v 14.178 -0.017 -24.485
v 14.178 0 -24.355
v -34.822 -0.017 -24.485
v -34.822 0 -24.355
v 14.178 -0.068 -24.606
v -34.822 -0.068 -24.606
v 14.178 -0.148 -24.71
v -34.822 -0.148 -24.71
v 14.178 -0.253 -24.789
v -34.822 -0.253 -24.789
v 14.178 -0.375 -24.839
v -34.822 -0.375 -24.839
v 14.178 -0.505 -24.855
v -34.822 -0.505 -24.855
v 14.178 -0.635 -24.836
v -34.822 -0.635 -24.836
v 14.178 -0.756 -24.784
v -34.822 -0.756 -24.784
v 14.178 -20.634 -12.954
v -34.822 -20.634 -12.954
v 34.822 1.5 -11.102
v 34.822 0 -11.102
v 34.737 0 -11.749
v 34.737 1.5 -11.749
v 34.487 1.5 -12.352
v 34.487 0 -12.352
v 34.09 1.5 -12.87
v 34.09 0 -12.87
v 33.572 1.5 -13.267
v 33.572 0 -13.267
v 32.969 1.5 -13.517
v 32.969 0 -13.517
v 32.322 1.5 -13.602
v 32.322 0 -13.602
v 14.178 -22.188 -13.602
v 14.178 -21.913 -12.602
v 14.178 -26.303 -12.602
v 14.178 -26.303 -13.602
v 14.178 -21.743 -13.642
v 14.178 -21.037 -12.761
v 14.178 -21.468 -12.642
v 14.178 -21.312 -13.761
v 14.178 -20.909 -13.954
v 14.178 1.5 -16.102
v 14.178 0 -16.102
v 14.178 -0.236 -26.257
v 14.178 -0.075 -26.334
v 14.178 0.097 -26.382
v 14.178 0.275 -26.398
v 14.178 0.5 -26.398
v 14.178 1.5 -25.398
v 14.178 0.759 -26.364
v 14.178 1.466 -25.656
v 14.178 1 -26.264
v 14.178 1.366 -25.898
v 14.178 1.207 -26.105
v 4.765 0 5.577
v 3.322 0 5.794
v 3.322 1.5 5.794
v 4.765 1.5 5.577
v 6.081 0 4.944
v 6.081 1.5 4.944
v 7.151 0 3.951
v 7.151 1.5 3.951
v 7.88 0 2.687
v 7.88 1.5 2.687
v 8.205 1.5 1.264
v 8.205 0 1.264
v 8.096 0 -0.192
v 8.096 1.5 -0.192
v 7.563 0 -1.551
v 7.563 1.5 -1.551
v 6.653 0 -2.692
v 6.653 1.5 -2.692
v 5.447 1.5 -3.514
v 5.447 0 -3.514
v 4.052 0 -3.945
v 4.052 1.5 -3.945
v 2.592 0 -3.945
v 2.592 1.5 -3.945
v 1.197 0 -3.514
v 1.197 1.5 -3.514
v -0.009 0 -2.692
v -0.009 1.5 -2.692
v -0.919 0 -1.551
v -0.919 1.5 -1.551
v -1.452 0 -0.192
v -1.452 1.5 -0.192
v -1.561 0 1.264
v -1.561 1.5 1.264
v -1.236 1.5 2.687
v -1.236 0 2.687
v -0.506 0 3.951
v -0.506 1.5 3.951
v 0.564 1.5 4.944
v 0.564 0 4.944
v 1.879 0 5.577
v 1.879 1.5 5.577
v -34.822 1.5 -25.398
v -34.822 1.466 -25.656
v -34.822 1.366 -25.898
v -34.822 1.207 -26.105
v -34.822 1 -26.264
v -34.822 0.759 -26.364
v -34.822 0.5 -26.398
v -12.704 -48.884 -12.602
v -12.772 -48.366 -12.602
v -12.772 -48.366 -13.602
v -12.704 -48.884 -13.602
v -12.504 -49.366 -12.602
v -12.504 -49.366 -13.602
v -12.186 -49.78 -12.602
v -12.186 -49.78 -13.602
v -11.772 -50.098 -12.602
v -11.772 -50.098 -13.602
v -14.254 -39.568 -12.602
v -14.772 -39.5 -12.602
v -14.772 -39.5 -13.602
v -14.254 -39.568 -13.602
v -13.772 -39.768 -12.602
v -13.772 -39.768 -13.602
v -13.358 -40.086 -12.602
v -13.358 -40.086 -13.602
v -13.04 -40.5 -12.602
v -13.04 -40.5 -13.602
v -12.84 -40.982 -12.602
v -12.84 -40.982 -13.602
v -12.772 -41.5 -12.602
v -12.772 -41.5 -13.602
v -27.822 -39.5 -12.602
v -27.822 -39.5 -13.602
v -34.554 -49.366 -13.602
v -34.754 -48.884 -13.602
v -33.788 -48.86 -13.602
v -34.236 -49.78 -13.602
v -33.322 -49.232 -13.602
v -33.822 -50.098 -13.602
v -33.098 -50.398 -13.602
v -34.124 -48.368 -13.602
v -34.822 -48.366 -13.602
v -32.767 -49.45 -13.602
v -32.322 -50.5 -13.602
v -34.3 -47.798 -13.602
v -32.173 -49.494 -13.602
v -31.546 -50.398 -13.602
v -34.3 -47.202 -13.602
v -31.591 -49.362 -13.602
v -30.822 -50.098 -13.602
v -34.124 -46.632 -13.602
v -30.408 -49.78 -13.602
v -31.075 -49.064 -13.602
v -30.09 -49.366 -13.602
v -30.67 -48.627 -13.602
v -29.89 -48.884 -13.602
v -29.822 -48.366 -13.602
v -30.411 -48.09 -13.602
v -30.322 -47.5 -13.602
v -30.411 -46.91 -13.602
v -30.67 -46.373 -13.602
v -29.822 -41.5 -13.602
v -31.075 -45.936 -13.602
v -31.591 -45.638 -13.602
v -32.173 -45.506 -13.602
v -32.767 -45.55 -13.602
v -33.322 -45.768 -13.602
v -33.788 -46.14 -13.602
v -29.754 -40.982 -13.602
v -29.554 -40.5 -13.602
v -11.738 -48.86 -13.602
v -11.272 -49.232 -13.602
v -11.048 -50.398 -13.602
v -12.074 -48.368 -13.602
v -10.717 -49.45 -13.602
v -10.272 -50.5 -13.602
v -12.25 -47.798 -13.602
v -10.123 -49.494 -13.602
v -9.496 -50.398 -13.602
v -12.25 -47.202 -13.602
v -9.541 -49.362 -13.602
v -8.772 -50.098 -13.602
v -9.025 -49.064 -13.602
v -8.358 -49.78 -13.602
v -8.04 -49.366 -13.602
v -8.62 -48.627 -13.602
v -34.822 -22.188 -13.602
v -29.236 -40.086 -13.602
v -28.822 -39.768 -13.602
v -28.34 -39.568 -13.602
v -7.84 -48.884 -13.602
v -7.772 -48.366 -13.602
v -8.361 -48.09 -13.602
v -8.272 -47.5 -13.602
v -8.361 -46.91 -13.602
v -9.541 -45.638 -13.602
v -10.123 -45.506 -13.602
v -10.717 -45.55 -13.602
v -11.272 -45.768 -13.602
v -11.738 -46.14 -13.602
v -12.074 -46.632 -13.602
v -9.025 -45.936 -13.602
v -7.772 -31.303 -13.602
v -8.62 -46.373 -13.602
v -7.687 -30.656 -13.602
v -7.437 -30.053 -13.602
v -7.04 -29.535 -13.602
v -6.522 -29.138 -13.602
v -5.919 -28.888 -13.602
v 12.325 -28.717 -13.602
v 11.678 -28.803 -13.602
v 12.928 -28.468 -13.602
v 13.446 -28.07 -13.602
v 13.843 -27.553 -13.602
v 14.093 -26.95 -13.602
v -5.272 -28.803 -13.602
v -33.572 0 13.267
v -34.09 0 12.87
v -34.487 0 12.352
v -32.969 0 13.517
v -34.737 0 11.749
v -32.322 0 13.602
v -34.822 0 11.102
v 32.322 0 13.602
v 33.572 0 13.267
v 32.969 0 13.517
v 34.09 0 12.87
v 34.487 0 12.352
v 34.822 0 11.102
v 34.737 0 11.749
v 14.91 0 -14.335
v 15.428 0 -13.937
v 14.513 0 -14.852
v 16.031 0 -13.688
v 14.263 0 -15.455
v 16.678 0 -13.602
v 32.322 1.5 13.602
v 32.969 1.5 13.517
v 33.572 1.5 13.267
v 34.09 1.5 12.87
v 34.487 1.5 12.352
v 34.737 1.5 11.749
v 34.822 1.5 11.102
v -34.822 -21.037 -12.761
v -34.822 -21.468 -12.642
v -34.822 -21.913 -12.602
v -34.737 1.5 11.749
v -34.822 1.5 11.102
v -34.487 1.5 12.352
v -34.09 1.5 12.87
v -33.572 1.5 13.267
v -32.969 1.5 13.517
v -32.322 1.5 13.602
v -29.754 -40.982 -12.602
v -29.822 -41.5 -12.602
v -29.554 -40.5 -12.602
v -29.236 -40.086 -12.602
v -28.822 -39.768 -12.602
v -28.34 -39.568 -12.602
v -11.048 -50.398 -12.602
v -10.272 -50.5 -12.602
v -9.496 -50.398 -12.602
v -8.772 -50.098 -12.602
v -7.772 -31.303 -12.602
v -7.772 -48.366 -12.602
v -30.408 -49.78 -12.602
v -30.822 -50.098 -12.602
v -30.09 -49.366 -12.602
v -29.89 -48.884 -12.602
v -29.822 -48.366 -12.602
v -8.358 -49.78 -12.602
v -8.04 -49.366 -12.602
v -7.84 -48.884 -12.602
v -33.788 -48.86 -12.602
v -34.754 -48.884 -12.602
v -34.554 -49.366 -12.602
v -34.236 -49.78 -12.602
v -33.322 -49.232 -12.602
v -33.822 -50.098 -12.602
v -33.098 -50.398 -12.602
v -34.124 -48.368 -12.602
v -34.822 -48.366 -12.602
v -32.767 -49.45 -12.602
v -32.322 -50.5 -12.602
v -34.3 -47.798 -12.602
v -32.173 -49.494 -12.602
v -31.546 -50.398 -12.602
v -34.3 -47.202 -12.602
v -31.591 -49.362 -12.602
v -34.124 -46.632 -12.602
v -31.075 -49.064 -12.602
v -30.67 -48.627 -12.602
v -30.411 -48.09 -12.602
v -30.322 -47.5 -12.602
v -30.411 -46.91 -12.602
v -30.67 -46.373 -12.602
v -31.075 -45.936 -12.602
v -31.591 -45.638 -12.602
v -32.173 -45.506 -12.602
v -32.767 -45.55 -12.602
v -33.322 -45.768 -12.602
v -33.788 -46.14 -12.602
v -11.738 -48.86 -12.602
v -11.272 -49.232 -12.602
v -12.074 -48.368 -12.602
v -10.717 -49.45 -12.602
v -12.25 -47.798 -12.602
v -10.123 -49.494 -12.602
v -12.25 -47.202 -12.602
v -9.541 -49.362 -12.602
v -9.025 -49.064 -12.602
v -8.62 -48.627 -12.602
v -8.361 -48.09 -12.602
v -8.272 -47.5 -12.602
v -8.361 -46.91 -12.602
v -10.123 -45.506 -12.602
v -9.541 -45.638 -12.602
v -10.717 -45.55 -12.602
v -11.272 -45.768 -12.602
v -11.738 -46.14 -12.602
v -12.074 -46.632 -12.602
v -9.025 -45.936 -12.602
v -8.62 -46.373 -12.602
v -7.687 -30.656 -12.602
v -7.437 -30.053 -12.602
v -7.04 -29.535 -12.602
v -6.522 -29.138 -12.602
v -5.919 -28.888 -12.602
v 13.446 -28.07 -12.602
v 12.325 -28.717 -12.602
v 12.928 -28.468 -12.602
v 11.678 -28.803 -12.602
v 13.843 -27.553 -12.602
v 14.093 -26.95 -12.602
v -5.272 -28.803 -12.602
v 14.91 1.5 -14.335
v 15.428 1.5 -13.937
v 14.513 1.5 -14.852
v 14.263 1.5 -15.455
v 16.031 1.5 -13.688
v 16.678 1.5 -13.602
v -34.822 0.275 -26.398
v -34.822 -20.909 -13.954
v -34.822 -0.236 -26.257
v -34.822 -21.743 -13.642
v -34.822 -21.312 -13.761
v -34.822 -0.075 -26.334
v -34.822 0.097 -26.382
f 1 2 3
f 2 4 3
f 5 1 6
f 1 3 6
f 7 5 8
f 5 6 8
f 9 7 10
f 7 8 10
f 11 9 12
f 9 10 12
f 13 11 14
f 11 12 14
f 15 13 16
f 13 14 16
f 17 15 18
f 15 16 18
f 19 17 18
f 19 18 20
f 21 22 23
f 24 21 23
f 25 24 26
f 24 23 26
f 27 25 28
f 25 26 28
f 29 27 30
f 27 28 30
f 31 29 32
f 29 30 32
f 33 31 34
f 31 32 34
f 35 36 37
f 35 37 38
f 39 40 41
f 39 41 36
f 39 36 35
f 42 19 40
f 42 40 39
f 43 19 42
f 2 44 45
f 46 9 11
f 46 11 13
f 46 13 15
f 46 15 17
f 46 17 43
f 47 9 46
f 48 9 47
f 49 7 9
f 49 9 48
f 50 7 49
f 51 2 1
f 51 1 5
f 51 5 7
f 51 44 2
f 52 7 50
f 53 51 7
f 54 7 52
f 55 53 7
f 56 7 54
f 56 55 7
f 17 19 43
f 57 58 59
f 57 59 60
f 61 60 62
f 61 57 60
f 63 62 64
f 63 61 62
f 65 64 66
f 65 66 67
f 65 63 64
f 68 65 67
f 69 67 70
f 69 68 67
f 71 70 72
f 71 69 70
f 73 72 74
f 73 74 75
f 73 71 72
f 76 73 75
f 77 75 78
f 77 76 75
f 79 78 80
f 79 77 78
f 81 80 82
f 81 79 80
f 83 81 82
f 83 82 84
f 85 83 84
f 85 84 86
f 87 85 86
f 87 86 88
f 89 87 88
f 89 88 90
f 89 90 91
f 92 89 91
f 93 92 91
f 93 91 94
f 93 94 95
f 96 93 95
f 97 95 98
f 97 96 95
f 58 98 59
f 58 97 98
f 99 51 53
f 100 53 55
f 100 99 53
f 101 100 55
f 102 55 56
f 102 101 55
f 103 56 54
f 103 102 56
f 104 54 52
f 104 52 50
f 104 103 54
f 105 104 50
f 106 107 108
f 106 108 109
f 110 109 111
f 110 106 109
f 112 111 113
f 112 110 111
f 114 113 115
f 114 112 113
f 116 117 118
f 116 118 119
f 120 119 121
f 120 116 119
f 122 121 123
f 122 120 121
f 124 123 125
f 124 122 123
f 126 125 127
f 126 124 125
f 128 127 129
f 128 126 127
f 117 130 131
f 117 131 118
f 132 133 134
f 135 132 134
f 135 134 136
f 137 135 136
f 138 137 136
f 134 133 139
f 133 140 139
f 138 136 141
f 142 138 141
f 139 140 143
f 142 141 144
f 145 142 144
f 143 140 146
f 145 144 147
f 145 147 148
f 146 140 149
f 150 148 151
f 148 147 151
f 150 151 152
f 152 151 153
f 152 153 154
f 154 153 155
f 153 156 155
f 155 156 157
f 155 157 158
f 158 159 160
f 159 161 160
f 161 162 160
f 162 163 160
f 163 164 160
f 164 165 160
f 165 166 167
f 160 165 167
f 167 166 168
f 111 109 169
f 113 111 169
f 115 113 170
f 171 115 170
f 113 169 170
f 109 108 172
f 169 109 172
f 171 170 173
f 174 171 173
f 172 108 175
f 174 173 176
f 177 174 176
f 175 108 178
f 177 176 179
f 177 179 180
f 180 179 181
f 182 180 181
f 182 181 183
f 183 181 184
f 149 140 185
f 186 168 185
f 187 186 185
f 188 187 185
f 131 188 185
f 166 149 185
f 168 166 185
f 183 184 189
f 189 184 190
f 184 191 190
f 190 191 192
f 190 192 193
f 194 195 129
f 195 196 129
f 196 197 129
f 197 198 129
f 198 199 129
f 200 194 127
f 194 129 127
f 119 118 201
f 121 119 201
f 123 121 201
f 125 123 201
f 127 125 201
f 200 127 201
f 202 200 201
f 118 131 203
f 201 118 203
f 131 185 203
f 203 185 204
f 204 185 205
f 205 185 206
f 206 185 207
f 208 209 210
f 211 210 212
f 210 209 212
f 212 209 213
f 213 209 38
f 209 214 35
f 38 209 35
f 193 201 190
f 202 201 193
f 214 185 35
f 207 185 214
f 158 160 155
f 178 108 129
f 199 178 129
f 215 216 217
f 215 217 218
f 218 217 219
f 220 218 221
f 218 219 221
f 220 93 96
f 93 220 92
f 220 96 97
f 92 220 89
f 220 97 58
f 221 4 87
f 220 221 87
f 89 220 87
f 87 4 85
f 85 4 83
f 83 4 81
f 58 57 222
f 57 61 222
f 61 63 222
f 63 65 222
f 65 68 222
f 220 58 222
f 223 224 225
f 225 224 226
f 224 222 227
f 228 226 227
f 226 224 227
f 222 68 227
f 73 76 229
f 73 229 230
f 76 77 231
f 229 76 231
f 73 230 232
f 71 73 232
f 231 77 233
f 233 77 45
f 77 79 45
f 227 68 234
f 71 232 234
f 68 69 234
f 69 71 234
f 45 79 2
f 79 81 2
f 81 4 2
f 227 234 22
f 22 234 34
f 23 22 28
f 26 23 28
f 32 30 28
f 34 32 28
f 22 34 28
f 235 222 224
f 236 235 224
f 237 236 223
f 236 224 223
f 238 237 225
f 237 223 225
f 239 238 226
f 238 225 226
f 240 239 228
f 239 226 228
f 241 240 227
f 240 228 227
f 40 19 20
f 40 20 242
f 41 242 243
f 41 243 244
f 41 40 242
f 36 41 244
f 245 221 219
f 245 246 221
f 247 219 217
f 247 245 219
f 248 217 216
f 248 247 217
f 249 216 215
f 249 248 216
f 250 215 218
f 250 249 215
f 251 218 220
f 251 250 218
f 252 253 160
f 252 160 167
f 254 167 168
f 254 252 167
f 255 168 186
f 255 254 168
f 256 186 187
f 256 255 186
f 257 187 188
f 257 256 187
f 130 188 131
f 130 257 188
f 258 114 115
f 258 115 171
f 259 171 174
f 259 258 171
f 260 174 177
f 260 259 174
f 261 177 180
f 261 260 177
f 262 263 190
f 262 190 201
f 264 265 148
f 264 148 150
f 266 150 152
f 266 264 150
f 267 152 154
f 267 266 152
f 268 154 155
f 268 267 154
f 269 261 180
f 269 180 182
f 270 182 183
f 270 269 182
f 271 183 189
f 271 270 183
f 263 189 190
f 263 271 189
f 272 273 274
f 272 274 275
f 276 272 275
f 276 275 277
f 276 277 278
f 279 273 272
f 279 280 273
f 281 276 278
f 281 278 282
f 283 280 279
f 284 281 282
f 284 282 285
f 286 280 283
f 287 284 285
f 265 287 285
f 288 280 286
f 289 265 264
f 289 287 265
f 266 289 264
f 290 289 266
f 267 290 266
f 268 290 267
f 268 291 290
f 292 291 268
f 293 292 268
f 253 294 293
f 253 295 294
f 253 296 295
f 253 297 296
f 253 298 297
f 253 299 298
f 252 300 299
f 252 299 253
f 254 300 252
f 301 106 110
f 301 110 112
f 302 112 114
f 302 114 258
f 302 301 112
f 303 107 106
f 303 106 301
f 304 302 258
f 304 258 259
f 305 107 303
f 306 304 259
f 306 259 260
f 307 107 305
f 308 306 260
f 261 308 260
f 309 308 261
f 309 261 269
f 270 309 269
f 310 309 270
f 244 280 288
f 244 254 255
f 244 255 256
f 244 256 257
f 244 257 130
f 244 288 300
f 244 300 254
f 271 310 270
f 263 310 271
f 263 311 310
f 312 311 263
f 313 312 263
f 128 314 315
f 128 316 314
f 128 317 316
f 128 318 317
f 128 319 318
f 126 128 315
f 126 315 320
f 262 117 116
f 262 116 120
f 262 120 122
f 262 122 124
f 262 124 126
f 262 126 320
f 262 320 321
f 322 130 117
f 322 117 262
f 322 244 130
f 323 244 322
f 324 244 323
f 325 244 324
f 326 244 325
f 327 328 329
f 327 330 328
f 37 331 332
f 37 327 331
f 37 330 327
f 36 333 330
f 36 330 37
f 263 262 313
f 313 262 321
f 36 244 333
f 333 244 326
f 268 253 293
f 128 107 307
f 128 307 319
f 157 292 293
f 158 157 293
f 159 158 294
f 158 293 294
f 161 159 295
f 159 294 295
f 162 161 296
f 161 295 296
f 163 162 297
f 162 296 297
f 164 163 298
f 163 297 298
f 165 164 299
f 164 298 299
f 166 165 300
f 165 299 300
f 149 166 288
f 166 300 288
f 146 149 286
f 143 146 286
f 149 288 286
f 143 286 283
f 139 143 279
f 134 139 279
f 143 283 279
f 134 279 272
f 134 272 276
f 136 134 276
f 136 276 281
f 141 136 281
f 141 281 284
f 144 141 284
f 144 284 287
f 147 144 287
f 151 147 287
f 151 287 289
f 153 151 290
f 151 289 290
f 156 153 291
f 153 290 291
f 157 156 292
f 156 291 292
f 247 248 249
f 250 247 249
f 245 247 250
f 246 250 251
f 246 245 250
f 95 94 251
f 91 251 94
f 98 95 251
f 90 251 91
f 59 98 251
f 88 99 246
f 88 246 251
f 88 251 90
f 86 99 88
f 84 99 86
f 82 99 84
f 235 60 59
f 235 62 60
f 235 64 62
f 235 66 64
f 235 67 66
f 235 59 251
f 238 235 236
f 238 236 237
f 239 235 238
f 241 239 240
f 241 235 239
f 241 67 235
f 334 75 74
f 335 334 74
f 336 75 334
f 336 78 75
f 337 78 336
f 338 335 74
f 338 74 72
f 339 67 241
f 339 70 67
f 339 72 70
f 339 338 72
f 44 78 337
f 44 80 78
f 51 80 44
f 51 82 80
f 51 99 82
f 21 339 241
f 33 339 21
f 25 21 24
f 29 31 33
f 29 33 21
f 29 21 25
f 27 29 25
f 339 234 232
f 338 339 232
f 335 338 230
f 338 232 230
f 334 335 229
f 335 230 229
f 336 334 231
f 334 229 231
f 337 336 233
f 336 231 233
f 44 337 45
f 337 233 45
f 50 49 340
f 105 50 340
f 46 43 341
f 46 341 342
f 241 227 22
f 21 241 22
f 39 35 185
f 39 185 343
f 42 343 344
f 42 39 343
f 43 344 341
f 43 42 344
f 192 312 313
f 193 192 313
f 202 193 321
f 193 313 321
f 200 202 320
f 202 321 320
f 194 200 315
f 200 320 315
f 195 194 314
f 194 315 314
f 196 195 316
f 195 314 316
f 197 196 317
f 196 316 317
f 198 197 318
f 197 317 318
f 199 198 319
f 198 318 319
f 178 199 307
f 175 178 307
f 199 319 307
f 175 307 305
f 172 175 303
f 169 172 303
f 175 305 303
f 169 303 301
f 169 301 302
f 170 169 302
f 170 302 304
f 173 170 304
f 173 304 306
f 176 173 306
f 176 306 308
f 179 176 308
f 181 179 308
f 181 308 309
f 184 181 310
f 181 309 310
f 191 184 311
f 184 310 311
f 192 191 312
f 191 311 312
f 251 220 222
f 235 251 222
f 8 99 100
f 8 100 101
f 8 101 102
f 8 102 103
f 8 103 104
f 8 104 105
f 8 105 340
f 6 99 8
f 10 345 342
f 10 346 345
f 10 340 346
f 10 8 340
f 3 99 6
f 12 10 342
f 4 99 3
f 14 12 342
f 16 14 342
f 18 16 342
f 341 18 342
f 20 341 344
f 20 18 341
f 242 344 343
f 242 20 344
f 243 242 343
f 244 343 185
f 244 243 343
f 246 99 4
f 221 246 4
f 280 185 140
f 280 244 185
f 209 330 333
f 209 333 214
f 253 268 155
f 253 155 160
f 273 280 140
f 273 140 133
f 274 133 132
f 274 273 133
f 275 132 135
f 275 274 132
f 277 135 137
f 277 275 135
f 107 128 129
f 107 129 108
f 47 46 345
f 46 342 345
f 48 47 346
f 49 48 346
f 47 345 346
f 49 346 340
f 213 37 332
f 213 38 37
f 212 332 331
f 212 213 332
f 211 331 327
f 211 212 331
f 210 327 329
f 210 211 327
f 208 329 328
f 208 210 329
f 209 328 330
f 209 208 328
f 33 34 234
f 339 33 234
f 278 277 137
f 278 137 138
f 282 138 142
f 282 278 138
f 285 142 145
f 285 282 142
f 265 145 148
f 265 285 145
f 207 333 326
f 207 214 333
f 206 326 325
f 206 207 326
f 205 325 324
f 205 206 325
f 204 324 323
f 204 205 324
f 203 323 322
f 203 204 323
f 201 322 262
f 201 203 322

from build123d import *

# Parameters (mm, degrees)
SKETCH1_R           = 4.896847049
BOSS_EXTRUDE1_DEPTH = 1.5
BOSS_EXTRUDE4_DEPTH = 49
FILLET1_R           = 1
FILLET2_R           = 0.5
SKETCH3_R           = 2
BOSS_EXTRUDE6_DEPTH = 1
FILLET3_R           = 2.5
FILLET4_R           = 2.5


with BuildPart() as part:
    # Sketch1 → Boss-Extrude1 (new body)
    with BuildSketch(Plane(origin=(0, 0, 0), x_dir=(1, 0, 0), z_dir=(0, 1, 0))):
        with BuildLine():
            Line((-32.322023461, -13.602352914), (32.322023461, -13.602352914))
            ThreePointArc((32.322023461, -13.602352914), (34.089790414, -12.870119867), (34.822023461, -11.102352914))
            Line((34.822023461, -11.102352914), (34.822023461, 11.102352914))
            ThreePointArc((34.822023461, 11.102352914), (34.089790414, 12.870119867), (32.322023461, 13.602352914))
            Line((32.322023461, 13.602352914), (16.677976539, 13.602352914))
            ThreePointArc((16.677976539, 13.602352914), (14.910209586, 14.334585961), (14.177976539, 16.102352914))
            Line((14.177976539, 16.102352914), (14.177976539, 26.397647086))
            Line((14.177976539, 26.397647086), (-32.322023461, 26.397647086))
            Line((-32.322023461, 26.397647086), (-34.822023461, 26.397647086))
            Line((-34.822023461, 26.397647086), (-34.822023461, 23.897647086))
            Line((-34.822023461, 23.897647086), (-34.822023461, 13.602352914))
            Line((-34.822023461, 13.602352914), (-34.822023461, -11.102352914))
            Line((-34.822023461, -11.102352914), (-34.822023461, -13.602352914))
            Line((-34.822023461, -13.602352914), (-32.322023461, -13.602352914))
        make_face()
        with Locations(Location((3.322023461, -0.897647086, 0), (0, 0, 270))):
            Circle(SKETCH1_R, mode=Mode.SUBTRACT)
    extrude(amount=BOSS_EXTRUDE1_DEPTH)

    # Sketch2 → Boss-Extrude4 (add)
    with BuildSketch(Plane(origin=(14.177976539, 0, 0), x_dir=(0, 0, -1), z_dir=(1, 0, 0))):
        with BuildLine():
            Line((25.233954828, 0), (12.954018608, -20.634041328))
            ThreePointArc((12.954018608, -20.634041328), (12.691872074, -21.249569549), (12.602352914, -21.912579441))
            Line((12.602352914, -21.912579441), (12.602352914, -28.802677945))
            Line((12.602352914, -28.802677945), (13.602352914, -28.802677945))
            Line((13.602352914, -28.802677945), (13.602352914, -22.187632402))
            ThreePointArc((13.602352914, -22.187632402), (13.691872074, -21.52462251), (13.954018608, -20.909094288))
            Line((13.954018608, -20.909094288), (26.397647086, 0))
            Line((26.397647086, 0), (25.233954828, 0))
        make_face()
    extrude(amount=-BOSS_EXTRUDE4_DEPTH)

    # Fillet1
    fillet1_edges = [part.edges().sort_by_distance(p)[0] for p in [
        (-10.322023461, 0, -26.397647086),
        (-10.322023461, 1.5, -26.397647086),
    ]]
    fillet(fillet1_edges, radius=FILLET1_R)

    # Fillet2
    fillet2_edges = [part.edges().sort_by_distance(p)[0] for p in [
        (-10.322023461, 0, -25.233954828),
    ]]
    fillet(fillet2_edges, radius=FILLET2_R)

    # Sketch3 → Boss-Extrude6 (add)
    with BuildSketch(Plane.XY.offset(-12.602352914)):
        with BuildLine():
            Line((-27.822023461, -39.5), (-14.772023461, -39.5))
            ThreePointArc((-14.772023461, -39.5), (-13.357809898, -40.085786438), (-12.772023461, -41.5))
            Line((-12.772023461, -41.5), (-12.772023461, -48.366025404))
            ThreePointArc((-12.772023461, -48.366025404), (-12.504074268, -49.366025404), (-11.772023461, -50.098076211))
            ThreePointArc((-11.772023461, -50.098076211), (-10.272023461, -50.5), (-8.772023461, -50.098076211))
            ThreePointArc((-8.772023461, -50.098076211), (-8.039972653, -49.366025404), (-7.772023461, -48.366025404))
            Line((-7.772023461, -48.366025404), (-7.772023461, -39.5))
            Line((-7.772023461, -39.5), (-7.772023461, -28.802677945))
            Line((-7.772023461, -28.802677945), (-34.822023461, -28.802677945))
            Line((-34.822023461, -28.802677945), (-34.822023461, -39.5))
            Line((-34.822023461, -39.5), (-34.822023461, -48.366025404))
            ThreePointArc((-34.822023461, -48.366025404), (-34.554074268, -49.366025404), (-33.822023461, -50.098076211))
            ThreePointArc((-33.822023461, -50.098076211), (-32.322023461, -50.5), (-30.822023461, -50.098076211))
            ThreePointArc((-30.822023461, -50.098076211), (-30.089972653, -49.366025404), (-29.822023461, -48.366025404))
            Line((-29.822023461, -48.366025404), (-29.822023461, -41.5))
            ThreePointArc((-29.822023461, -41.5), (-29.236237023, -40.085786438), (-27.822023461, -39.5))
        make_face()
        with Locations((-32.322023461, -47.5)):
            Circle(SKETCH3_R, mode=Mode.SUBTRACT)
        with Locations((-10.272023461, -47.5)):
            Circle(SKETCH3_R, mode=Mode.SUBTRACT)
    extrude(amount=-BOSS_EXTRUDE6_DEPTH)

    # Fillet3
    fillet3_edges = [part.edges().sort_by_distance(p)[0] for p in [
        (14.177976539, -28.802677945, -13.102352914),
        (-7.772023461, -28.802677945, -13.102352914),
    ]]
    fillet(fillet3_edges, radius=FILLET3_R)

    # Fillet4
    fillet4_edges = [part.edges().sort_by_distance(p)[0] for p in [
        (-34.822023461, 0.75, 13.602352914),
    ]]
    fillet(fillet4_edges, radius=FILLET4_R)


solid = part.part
